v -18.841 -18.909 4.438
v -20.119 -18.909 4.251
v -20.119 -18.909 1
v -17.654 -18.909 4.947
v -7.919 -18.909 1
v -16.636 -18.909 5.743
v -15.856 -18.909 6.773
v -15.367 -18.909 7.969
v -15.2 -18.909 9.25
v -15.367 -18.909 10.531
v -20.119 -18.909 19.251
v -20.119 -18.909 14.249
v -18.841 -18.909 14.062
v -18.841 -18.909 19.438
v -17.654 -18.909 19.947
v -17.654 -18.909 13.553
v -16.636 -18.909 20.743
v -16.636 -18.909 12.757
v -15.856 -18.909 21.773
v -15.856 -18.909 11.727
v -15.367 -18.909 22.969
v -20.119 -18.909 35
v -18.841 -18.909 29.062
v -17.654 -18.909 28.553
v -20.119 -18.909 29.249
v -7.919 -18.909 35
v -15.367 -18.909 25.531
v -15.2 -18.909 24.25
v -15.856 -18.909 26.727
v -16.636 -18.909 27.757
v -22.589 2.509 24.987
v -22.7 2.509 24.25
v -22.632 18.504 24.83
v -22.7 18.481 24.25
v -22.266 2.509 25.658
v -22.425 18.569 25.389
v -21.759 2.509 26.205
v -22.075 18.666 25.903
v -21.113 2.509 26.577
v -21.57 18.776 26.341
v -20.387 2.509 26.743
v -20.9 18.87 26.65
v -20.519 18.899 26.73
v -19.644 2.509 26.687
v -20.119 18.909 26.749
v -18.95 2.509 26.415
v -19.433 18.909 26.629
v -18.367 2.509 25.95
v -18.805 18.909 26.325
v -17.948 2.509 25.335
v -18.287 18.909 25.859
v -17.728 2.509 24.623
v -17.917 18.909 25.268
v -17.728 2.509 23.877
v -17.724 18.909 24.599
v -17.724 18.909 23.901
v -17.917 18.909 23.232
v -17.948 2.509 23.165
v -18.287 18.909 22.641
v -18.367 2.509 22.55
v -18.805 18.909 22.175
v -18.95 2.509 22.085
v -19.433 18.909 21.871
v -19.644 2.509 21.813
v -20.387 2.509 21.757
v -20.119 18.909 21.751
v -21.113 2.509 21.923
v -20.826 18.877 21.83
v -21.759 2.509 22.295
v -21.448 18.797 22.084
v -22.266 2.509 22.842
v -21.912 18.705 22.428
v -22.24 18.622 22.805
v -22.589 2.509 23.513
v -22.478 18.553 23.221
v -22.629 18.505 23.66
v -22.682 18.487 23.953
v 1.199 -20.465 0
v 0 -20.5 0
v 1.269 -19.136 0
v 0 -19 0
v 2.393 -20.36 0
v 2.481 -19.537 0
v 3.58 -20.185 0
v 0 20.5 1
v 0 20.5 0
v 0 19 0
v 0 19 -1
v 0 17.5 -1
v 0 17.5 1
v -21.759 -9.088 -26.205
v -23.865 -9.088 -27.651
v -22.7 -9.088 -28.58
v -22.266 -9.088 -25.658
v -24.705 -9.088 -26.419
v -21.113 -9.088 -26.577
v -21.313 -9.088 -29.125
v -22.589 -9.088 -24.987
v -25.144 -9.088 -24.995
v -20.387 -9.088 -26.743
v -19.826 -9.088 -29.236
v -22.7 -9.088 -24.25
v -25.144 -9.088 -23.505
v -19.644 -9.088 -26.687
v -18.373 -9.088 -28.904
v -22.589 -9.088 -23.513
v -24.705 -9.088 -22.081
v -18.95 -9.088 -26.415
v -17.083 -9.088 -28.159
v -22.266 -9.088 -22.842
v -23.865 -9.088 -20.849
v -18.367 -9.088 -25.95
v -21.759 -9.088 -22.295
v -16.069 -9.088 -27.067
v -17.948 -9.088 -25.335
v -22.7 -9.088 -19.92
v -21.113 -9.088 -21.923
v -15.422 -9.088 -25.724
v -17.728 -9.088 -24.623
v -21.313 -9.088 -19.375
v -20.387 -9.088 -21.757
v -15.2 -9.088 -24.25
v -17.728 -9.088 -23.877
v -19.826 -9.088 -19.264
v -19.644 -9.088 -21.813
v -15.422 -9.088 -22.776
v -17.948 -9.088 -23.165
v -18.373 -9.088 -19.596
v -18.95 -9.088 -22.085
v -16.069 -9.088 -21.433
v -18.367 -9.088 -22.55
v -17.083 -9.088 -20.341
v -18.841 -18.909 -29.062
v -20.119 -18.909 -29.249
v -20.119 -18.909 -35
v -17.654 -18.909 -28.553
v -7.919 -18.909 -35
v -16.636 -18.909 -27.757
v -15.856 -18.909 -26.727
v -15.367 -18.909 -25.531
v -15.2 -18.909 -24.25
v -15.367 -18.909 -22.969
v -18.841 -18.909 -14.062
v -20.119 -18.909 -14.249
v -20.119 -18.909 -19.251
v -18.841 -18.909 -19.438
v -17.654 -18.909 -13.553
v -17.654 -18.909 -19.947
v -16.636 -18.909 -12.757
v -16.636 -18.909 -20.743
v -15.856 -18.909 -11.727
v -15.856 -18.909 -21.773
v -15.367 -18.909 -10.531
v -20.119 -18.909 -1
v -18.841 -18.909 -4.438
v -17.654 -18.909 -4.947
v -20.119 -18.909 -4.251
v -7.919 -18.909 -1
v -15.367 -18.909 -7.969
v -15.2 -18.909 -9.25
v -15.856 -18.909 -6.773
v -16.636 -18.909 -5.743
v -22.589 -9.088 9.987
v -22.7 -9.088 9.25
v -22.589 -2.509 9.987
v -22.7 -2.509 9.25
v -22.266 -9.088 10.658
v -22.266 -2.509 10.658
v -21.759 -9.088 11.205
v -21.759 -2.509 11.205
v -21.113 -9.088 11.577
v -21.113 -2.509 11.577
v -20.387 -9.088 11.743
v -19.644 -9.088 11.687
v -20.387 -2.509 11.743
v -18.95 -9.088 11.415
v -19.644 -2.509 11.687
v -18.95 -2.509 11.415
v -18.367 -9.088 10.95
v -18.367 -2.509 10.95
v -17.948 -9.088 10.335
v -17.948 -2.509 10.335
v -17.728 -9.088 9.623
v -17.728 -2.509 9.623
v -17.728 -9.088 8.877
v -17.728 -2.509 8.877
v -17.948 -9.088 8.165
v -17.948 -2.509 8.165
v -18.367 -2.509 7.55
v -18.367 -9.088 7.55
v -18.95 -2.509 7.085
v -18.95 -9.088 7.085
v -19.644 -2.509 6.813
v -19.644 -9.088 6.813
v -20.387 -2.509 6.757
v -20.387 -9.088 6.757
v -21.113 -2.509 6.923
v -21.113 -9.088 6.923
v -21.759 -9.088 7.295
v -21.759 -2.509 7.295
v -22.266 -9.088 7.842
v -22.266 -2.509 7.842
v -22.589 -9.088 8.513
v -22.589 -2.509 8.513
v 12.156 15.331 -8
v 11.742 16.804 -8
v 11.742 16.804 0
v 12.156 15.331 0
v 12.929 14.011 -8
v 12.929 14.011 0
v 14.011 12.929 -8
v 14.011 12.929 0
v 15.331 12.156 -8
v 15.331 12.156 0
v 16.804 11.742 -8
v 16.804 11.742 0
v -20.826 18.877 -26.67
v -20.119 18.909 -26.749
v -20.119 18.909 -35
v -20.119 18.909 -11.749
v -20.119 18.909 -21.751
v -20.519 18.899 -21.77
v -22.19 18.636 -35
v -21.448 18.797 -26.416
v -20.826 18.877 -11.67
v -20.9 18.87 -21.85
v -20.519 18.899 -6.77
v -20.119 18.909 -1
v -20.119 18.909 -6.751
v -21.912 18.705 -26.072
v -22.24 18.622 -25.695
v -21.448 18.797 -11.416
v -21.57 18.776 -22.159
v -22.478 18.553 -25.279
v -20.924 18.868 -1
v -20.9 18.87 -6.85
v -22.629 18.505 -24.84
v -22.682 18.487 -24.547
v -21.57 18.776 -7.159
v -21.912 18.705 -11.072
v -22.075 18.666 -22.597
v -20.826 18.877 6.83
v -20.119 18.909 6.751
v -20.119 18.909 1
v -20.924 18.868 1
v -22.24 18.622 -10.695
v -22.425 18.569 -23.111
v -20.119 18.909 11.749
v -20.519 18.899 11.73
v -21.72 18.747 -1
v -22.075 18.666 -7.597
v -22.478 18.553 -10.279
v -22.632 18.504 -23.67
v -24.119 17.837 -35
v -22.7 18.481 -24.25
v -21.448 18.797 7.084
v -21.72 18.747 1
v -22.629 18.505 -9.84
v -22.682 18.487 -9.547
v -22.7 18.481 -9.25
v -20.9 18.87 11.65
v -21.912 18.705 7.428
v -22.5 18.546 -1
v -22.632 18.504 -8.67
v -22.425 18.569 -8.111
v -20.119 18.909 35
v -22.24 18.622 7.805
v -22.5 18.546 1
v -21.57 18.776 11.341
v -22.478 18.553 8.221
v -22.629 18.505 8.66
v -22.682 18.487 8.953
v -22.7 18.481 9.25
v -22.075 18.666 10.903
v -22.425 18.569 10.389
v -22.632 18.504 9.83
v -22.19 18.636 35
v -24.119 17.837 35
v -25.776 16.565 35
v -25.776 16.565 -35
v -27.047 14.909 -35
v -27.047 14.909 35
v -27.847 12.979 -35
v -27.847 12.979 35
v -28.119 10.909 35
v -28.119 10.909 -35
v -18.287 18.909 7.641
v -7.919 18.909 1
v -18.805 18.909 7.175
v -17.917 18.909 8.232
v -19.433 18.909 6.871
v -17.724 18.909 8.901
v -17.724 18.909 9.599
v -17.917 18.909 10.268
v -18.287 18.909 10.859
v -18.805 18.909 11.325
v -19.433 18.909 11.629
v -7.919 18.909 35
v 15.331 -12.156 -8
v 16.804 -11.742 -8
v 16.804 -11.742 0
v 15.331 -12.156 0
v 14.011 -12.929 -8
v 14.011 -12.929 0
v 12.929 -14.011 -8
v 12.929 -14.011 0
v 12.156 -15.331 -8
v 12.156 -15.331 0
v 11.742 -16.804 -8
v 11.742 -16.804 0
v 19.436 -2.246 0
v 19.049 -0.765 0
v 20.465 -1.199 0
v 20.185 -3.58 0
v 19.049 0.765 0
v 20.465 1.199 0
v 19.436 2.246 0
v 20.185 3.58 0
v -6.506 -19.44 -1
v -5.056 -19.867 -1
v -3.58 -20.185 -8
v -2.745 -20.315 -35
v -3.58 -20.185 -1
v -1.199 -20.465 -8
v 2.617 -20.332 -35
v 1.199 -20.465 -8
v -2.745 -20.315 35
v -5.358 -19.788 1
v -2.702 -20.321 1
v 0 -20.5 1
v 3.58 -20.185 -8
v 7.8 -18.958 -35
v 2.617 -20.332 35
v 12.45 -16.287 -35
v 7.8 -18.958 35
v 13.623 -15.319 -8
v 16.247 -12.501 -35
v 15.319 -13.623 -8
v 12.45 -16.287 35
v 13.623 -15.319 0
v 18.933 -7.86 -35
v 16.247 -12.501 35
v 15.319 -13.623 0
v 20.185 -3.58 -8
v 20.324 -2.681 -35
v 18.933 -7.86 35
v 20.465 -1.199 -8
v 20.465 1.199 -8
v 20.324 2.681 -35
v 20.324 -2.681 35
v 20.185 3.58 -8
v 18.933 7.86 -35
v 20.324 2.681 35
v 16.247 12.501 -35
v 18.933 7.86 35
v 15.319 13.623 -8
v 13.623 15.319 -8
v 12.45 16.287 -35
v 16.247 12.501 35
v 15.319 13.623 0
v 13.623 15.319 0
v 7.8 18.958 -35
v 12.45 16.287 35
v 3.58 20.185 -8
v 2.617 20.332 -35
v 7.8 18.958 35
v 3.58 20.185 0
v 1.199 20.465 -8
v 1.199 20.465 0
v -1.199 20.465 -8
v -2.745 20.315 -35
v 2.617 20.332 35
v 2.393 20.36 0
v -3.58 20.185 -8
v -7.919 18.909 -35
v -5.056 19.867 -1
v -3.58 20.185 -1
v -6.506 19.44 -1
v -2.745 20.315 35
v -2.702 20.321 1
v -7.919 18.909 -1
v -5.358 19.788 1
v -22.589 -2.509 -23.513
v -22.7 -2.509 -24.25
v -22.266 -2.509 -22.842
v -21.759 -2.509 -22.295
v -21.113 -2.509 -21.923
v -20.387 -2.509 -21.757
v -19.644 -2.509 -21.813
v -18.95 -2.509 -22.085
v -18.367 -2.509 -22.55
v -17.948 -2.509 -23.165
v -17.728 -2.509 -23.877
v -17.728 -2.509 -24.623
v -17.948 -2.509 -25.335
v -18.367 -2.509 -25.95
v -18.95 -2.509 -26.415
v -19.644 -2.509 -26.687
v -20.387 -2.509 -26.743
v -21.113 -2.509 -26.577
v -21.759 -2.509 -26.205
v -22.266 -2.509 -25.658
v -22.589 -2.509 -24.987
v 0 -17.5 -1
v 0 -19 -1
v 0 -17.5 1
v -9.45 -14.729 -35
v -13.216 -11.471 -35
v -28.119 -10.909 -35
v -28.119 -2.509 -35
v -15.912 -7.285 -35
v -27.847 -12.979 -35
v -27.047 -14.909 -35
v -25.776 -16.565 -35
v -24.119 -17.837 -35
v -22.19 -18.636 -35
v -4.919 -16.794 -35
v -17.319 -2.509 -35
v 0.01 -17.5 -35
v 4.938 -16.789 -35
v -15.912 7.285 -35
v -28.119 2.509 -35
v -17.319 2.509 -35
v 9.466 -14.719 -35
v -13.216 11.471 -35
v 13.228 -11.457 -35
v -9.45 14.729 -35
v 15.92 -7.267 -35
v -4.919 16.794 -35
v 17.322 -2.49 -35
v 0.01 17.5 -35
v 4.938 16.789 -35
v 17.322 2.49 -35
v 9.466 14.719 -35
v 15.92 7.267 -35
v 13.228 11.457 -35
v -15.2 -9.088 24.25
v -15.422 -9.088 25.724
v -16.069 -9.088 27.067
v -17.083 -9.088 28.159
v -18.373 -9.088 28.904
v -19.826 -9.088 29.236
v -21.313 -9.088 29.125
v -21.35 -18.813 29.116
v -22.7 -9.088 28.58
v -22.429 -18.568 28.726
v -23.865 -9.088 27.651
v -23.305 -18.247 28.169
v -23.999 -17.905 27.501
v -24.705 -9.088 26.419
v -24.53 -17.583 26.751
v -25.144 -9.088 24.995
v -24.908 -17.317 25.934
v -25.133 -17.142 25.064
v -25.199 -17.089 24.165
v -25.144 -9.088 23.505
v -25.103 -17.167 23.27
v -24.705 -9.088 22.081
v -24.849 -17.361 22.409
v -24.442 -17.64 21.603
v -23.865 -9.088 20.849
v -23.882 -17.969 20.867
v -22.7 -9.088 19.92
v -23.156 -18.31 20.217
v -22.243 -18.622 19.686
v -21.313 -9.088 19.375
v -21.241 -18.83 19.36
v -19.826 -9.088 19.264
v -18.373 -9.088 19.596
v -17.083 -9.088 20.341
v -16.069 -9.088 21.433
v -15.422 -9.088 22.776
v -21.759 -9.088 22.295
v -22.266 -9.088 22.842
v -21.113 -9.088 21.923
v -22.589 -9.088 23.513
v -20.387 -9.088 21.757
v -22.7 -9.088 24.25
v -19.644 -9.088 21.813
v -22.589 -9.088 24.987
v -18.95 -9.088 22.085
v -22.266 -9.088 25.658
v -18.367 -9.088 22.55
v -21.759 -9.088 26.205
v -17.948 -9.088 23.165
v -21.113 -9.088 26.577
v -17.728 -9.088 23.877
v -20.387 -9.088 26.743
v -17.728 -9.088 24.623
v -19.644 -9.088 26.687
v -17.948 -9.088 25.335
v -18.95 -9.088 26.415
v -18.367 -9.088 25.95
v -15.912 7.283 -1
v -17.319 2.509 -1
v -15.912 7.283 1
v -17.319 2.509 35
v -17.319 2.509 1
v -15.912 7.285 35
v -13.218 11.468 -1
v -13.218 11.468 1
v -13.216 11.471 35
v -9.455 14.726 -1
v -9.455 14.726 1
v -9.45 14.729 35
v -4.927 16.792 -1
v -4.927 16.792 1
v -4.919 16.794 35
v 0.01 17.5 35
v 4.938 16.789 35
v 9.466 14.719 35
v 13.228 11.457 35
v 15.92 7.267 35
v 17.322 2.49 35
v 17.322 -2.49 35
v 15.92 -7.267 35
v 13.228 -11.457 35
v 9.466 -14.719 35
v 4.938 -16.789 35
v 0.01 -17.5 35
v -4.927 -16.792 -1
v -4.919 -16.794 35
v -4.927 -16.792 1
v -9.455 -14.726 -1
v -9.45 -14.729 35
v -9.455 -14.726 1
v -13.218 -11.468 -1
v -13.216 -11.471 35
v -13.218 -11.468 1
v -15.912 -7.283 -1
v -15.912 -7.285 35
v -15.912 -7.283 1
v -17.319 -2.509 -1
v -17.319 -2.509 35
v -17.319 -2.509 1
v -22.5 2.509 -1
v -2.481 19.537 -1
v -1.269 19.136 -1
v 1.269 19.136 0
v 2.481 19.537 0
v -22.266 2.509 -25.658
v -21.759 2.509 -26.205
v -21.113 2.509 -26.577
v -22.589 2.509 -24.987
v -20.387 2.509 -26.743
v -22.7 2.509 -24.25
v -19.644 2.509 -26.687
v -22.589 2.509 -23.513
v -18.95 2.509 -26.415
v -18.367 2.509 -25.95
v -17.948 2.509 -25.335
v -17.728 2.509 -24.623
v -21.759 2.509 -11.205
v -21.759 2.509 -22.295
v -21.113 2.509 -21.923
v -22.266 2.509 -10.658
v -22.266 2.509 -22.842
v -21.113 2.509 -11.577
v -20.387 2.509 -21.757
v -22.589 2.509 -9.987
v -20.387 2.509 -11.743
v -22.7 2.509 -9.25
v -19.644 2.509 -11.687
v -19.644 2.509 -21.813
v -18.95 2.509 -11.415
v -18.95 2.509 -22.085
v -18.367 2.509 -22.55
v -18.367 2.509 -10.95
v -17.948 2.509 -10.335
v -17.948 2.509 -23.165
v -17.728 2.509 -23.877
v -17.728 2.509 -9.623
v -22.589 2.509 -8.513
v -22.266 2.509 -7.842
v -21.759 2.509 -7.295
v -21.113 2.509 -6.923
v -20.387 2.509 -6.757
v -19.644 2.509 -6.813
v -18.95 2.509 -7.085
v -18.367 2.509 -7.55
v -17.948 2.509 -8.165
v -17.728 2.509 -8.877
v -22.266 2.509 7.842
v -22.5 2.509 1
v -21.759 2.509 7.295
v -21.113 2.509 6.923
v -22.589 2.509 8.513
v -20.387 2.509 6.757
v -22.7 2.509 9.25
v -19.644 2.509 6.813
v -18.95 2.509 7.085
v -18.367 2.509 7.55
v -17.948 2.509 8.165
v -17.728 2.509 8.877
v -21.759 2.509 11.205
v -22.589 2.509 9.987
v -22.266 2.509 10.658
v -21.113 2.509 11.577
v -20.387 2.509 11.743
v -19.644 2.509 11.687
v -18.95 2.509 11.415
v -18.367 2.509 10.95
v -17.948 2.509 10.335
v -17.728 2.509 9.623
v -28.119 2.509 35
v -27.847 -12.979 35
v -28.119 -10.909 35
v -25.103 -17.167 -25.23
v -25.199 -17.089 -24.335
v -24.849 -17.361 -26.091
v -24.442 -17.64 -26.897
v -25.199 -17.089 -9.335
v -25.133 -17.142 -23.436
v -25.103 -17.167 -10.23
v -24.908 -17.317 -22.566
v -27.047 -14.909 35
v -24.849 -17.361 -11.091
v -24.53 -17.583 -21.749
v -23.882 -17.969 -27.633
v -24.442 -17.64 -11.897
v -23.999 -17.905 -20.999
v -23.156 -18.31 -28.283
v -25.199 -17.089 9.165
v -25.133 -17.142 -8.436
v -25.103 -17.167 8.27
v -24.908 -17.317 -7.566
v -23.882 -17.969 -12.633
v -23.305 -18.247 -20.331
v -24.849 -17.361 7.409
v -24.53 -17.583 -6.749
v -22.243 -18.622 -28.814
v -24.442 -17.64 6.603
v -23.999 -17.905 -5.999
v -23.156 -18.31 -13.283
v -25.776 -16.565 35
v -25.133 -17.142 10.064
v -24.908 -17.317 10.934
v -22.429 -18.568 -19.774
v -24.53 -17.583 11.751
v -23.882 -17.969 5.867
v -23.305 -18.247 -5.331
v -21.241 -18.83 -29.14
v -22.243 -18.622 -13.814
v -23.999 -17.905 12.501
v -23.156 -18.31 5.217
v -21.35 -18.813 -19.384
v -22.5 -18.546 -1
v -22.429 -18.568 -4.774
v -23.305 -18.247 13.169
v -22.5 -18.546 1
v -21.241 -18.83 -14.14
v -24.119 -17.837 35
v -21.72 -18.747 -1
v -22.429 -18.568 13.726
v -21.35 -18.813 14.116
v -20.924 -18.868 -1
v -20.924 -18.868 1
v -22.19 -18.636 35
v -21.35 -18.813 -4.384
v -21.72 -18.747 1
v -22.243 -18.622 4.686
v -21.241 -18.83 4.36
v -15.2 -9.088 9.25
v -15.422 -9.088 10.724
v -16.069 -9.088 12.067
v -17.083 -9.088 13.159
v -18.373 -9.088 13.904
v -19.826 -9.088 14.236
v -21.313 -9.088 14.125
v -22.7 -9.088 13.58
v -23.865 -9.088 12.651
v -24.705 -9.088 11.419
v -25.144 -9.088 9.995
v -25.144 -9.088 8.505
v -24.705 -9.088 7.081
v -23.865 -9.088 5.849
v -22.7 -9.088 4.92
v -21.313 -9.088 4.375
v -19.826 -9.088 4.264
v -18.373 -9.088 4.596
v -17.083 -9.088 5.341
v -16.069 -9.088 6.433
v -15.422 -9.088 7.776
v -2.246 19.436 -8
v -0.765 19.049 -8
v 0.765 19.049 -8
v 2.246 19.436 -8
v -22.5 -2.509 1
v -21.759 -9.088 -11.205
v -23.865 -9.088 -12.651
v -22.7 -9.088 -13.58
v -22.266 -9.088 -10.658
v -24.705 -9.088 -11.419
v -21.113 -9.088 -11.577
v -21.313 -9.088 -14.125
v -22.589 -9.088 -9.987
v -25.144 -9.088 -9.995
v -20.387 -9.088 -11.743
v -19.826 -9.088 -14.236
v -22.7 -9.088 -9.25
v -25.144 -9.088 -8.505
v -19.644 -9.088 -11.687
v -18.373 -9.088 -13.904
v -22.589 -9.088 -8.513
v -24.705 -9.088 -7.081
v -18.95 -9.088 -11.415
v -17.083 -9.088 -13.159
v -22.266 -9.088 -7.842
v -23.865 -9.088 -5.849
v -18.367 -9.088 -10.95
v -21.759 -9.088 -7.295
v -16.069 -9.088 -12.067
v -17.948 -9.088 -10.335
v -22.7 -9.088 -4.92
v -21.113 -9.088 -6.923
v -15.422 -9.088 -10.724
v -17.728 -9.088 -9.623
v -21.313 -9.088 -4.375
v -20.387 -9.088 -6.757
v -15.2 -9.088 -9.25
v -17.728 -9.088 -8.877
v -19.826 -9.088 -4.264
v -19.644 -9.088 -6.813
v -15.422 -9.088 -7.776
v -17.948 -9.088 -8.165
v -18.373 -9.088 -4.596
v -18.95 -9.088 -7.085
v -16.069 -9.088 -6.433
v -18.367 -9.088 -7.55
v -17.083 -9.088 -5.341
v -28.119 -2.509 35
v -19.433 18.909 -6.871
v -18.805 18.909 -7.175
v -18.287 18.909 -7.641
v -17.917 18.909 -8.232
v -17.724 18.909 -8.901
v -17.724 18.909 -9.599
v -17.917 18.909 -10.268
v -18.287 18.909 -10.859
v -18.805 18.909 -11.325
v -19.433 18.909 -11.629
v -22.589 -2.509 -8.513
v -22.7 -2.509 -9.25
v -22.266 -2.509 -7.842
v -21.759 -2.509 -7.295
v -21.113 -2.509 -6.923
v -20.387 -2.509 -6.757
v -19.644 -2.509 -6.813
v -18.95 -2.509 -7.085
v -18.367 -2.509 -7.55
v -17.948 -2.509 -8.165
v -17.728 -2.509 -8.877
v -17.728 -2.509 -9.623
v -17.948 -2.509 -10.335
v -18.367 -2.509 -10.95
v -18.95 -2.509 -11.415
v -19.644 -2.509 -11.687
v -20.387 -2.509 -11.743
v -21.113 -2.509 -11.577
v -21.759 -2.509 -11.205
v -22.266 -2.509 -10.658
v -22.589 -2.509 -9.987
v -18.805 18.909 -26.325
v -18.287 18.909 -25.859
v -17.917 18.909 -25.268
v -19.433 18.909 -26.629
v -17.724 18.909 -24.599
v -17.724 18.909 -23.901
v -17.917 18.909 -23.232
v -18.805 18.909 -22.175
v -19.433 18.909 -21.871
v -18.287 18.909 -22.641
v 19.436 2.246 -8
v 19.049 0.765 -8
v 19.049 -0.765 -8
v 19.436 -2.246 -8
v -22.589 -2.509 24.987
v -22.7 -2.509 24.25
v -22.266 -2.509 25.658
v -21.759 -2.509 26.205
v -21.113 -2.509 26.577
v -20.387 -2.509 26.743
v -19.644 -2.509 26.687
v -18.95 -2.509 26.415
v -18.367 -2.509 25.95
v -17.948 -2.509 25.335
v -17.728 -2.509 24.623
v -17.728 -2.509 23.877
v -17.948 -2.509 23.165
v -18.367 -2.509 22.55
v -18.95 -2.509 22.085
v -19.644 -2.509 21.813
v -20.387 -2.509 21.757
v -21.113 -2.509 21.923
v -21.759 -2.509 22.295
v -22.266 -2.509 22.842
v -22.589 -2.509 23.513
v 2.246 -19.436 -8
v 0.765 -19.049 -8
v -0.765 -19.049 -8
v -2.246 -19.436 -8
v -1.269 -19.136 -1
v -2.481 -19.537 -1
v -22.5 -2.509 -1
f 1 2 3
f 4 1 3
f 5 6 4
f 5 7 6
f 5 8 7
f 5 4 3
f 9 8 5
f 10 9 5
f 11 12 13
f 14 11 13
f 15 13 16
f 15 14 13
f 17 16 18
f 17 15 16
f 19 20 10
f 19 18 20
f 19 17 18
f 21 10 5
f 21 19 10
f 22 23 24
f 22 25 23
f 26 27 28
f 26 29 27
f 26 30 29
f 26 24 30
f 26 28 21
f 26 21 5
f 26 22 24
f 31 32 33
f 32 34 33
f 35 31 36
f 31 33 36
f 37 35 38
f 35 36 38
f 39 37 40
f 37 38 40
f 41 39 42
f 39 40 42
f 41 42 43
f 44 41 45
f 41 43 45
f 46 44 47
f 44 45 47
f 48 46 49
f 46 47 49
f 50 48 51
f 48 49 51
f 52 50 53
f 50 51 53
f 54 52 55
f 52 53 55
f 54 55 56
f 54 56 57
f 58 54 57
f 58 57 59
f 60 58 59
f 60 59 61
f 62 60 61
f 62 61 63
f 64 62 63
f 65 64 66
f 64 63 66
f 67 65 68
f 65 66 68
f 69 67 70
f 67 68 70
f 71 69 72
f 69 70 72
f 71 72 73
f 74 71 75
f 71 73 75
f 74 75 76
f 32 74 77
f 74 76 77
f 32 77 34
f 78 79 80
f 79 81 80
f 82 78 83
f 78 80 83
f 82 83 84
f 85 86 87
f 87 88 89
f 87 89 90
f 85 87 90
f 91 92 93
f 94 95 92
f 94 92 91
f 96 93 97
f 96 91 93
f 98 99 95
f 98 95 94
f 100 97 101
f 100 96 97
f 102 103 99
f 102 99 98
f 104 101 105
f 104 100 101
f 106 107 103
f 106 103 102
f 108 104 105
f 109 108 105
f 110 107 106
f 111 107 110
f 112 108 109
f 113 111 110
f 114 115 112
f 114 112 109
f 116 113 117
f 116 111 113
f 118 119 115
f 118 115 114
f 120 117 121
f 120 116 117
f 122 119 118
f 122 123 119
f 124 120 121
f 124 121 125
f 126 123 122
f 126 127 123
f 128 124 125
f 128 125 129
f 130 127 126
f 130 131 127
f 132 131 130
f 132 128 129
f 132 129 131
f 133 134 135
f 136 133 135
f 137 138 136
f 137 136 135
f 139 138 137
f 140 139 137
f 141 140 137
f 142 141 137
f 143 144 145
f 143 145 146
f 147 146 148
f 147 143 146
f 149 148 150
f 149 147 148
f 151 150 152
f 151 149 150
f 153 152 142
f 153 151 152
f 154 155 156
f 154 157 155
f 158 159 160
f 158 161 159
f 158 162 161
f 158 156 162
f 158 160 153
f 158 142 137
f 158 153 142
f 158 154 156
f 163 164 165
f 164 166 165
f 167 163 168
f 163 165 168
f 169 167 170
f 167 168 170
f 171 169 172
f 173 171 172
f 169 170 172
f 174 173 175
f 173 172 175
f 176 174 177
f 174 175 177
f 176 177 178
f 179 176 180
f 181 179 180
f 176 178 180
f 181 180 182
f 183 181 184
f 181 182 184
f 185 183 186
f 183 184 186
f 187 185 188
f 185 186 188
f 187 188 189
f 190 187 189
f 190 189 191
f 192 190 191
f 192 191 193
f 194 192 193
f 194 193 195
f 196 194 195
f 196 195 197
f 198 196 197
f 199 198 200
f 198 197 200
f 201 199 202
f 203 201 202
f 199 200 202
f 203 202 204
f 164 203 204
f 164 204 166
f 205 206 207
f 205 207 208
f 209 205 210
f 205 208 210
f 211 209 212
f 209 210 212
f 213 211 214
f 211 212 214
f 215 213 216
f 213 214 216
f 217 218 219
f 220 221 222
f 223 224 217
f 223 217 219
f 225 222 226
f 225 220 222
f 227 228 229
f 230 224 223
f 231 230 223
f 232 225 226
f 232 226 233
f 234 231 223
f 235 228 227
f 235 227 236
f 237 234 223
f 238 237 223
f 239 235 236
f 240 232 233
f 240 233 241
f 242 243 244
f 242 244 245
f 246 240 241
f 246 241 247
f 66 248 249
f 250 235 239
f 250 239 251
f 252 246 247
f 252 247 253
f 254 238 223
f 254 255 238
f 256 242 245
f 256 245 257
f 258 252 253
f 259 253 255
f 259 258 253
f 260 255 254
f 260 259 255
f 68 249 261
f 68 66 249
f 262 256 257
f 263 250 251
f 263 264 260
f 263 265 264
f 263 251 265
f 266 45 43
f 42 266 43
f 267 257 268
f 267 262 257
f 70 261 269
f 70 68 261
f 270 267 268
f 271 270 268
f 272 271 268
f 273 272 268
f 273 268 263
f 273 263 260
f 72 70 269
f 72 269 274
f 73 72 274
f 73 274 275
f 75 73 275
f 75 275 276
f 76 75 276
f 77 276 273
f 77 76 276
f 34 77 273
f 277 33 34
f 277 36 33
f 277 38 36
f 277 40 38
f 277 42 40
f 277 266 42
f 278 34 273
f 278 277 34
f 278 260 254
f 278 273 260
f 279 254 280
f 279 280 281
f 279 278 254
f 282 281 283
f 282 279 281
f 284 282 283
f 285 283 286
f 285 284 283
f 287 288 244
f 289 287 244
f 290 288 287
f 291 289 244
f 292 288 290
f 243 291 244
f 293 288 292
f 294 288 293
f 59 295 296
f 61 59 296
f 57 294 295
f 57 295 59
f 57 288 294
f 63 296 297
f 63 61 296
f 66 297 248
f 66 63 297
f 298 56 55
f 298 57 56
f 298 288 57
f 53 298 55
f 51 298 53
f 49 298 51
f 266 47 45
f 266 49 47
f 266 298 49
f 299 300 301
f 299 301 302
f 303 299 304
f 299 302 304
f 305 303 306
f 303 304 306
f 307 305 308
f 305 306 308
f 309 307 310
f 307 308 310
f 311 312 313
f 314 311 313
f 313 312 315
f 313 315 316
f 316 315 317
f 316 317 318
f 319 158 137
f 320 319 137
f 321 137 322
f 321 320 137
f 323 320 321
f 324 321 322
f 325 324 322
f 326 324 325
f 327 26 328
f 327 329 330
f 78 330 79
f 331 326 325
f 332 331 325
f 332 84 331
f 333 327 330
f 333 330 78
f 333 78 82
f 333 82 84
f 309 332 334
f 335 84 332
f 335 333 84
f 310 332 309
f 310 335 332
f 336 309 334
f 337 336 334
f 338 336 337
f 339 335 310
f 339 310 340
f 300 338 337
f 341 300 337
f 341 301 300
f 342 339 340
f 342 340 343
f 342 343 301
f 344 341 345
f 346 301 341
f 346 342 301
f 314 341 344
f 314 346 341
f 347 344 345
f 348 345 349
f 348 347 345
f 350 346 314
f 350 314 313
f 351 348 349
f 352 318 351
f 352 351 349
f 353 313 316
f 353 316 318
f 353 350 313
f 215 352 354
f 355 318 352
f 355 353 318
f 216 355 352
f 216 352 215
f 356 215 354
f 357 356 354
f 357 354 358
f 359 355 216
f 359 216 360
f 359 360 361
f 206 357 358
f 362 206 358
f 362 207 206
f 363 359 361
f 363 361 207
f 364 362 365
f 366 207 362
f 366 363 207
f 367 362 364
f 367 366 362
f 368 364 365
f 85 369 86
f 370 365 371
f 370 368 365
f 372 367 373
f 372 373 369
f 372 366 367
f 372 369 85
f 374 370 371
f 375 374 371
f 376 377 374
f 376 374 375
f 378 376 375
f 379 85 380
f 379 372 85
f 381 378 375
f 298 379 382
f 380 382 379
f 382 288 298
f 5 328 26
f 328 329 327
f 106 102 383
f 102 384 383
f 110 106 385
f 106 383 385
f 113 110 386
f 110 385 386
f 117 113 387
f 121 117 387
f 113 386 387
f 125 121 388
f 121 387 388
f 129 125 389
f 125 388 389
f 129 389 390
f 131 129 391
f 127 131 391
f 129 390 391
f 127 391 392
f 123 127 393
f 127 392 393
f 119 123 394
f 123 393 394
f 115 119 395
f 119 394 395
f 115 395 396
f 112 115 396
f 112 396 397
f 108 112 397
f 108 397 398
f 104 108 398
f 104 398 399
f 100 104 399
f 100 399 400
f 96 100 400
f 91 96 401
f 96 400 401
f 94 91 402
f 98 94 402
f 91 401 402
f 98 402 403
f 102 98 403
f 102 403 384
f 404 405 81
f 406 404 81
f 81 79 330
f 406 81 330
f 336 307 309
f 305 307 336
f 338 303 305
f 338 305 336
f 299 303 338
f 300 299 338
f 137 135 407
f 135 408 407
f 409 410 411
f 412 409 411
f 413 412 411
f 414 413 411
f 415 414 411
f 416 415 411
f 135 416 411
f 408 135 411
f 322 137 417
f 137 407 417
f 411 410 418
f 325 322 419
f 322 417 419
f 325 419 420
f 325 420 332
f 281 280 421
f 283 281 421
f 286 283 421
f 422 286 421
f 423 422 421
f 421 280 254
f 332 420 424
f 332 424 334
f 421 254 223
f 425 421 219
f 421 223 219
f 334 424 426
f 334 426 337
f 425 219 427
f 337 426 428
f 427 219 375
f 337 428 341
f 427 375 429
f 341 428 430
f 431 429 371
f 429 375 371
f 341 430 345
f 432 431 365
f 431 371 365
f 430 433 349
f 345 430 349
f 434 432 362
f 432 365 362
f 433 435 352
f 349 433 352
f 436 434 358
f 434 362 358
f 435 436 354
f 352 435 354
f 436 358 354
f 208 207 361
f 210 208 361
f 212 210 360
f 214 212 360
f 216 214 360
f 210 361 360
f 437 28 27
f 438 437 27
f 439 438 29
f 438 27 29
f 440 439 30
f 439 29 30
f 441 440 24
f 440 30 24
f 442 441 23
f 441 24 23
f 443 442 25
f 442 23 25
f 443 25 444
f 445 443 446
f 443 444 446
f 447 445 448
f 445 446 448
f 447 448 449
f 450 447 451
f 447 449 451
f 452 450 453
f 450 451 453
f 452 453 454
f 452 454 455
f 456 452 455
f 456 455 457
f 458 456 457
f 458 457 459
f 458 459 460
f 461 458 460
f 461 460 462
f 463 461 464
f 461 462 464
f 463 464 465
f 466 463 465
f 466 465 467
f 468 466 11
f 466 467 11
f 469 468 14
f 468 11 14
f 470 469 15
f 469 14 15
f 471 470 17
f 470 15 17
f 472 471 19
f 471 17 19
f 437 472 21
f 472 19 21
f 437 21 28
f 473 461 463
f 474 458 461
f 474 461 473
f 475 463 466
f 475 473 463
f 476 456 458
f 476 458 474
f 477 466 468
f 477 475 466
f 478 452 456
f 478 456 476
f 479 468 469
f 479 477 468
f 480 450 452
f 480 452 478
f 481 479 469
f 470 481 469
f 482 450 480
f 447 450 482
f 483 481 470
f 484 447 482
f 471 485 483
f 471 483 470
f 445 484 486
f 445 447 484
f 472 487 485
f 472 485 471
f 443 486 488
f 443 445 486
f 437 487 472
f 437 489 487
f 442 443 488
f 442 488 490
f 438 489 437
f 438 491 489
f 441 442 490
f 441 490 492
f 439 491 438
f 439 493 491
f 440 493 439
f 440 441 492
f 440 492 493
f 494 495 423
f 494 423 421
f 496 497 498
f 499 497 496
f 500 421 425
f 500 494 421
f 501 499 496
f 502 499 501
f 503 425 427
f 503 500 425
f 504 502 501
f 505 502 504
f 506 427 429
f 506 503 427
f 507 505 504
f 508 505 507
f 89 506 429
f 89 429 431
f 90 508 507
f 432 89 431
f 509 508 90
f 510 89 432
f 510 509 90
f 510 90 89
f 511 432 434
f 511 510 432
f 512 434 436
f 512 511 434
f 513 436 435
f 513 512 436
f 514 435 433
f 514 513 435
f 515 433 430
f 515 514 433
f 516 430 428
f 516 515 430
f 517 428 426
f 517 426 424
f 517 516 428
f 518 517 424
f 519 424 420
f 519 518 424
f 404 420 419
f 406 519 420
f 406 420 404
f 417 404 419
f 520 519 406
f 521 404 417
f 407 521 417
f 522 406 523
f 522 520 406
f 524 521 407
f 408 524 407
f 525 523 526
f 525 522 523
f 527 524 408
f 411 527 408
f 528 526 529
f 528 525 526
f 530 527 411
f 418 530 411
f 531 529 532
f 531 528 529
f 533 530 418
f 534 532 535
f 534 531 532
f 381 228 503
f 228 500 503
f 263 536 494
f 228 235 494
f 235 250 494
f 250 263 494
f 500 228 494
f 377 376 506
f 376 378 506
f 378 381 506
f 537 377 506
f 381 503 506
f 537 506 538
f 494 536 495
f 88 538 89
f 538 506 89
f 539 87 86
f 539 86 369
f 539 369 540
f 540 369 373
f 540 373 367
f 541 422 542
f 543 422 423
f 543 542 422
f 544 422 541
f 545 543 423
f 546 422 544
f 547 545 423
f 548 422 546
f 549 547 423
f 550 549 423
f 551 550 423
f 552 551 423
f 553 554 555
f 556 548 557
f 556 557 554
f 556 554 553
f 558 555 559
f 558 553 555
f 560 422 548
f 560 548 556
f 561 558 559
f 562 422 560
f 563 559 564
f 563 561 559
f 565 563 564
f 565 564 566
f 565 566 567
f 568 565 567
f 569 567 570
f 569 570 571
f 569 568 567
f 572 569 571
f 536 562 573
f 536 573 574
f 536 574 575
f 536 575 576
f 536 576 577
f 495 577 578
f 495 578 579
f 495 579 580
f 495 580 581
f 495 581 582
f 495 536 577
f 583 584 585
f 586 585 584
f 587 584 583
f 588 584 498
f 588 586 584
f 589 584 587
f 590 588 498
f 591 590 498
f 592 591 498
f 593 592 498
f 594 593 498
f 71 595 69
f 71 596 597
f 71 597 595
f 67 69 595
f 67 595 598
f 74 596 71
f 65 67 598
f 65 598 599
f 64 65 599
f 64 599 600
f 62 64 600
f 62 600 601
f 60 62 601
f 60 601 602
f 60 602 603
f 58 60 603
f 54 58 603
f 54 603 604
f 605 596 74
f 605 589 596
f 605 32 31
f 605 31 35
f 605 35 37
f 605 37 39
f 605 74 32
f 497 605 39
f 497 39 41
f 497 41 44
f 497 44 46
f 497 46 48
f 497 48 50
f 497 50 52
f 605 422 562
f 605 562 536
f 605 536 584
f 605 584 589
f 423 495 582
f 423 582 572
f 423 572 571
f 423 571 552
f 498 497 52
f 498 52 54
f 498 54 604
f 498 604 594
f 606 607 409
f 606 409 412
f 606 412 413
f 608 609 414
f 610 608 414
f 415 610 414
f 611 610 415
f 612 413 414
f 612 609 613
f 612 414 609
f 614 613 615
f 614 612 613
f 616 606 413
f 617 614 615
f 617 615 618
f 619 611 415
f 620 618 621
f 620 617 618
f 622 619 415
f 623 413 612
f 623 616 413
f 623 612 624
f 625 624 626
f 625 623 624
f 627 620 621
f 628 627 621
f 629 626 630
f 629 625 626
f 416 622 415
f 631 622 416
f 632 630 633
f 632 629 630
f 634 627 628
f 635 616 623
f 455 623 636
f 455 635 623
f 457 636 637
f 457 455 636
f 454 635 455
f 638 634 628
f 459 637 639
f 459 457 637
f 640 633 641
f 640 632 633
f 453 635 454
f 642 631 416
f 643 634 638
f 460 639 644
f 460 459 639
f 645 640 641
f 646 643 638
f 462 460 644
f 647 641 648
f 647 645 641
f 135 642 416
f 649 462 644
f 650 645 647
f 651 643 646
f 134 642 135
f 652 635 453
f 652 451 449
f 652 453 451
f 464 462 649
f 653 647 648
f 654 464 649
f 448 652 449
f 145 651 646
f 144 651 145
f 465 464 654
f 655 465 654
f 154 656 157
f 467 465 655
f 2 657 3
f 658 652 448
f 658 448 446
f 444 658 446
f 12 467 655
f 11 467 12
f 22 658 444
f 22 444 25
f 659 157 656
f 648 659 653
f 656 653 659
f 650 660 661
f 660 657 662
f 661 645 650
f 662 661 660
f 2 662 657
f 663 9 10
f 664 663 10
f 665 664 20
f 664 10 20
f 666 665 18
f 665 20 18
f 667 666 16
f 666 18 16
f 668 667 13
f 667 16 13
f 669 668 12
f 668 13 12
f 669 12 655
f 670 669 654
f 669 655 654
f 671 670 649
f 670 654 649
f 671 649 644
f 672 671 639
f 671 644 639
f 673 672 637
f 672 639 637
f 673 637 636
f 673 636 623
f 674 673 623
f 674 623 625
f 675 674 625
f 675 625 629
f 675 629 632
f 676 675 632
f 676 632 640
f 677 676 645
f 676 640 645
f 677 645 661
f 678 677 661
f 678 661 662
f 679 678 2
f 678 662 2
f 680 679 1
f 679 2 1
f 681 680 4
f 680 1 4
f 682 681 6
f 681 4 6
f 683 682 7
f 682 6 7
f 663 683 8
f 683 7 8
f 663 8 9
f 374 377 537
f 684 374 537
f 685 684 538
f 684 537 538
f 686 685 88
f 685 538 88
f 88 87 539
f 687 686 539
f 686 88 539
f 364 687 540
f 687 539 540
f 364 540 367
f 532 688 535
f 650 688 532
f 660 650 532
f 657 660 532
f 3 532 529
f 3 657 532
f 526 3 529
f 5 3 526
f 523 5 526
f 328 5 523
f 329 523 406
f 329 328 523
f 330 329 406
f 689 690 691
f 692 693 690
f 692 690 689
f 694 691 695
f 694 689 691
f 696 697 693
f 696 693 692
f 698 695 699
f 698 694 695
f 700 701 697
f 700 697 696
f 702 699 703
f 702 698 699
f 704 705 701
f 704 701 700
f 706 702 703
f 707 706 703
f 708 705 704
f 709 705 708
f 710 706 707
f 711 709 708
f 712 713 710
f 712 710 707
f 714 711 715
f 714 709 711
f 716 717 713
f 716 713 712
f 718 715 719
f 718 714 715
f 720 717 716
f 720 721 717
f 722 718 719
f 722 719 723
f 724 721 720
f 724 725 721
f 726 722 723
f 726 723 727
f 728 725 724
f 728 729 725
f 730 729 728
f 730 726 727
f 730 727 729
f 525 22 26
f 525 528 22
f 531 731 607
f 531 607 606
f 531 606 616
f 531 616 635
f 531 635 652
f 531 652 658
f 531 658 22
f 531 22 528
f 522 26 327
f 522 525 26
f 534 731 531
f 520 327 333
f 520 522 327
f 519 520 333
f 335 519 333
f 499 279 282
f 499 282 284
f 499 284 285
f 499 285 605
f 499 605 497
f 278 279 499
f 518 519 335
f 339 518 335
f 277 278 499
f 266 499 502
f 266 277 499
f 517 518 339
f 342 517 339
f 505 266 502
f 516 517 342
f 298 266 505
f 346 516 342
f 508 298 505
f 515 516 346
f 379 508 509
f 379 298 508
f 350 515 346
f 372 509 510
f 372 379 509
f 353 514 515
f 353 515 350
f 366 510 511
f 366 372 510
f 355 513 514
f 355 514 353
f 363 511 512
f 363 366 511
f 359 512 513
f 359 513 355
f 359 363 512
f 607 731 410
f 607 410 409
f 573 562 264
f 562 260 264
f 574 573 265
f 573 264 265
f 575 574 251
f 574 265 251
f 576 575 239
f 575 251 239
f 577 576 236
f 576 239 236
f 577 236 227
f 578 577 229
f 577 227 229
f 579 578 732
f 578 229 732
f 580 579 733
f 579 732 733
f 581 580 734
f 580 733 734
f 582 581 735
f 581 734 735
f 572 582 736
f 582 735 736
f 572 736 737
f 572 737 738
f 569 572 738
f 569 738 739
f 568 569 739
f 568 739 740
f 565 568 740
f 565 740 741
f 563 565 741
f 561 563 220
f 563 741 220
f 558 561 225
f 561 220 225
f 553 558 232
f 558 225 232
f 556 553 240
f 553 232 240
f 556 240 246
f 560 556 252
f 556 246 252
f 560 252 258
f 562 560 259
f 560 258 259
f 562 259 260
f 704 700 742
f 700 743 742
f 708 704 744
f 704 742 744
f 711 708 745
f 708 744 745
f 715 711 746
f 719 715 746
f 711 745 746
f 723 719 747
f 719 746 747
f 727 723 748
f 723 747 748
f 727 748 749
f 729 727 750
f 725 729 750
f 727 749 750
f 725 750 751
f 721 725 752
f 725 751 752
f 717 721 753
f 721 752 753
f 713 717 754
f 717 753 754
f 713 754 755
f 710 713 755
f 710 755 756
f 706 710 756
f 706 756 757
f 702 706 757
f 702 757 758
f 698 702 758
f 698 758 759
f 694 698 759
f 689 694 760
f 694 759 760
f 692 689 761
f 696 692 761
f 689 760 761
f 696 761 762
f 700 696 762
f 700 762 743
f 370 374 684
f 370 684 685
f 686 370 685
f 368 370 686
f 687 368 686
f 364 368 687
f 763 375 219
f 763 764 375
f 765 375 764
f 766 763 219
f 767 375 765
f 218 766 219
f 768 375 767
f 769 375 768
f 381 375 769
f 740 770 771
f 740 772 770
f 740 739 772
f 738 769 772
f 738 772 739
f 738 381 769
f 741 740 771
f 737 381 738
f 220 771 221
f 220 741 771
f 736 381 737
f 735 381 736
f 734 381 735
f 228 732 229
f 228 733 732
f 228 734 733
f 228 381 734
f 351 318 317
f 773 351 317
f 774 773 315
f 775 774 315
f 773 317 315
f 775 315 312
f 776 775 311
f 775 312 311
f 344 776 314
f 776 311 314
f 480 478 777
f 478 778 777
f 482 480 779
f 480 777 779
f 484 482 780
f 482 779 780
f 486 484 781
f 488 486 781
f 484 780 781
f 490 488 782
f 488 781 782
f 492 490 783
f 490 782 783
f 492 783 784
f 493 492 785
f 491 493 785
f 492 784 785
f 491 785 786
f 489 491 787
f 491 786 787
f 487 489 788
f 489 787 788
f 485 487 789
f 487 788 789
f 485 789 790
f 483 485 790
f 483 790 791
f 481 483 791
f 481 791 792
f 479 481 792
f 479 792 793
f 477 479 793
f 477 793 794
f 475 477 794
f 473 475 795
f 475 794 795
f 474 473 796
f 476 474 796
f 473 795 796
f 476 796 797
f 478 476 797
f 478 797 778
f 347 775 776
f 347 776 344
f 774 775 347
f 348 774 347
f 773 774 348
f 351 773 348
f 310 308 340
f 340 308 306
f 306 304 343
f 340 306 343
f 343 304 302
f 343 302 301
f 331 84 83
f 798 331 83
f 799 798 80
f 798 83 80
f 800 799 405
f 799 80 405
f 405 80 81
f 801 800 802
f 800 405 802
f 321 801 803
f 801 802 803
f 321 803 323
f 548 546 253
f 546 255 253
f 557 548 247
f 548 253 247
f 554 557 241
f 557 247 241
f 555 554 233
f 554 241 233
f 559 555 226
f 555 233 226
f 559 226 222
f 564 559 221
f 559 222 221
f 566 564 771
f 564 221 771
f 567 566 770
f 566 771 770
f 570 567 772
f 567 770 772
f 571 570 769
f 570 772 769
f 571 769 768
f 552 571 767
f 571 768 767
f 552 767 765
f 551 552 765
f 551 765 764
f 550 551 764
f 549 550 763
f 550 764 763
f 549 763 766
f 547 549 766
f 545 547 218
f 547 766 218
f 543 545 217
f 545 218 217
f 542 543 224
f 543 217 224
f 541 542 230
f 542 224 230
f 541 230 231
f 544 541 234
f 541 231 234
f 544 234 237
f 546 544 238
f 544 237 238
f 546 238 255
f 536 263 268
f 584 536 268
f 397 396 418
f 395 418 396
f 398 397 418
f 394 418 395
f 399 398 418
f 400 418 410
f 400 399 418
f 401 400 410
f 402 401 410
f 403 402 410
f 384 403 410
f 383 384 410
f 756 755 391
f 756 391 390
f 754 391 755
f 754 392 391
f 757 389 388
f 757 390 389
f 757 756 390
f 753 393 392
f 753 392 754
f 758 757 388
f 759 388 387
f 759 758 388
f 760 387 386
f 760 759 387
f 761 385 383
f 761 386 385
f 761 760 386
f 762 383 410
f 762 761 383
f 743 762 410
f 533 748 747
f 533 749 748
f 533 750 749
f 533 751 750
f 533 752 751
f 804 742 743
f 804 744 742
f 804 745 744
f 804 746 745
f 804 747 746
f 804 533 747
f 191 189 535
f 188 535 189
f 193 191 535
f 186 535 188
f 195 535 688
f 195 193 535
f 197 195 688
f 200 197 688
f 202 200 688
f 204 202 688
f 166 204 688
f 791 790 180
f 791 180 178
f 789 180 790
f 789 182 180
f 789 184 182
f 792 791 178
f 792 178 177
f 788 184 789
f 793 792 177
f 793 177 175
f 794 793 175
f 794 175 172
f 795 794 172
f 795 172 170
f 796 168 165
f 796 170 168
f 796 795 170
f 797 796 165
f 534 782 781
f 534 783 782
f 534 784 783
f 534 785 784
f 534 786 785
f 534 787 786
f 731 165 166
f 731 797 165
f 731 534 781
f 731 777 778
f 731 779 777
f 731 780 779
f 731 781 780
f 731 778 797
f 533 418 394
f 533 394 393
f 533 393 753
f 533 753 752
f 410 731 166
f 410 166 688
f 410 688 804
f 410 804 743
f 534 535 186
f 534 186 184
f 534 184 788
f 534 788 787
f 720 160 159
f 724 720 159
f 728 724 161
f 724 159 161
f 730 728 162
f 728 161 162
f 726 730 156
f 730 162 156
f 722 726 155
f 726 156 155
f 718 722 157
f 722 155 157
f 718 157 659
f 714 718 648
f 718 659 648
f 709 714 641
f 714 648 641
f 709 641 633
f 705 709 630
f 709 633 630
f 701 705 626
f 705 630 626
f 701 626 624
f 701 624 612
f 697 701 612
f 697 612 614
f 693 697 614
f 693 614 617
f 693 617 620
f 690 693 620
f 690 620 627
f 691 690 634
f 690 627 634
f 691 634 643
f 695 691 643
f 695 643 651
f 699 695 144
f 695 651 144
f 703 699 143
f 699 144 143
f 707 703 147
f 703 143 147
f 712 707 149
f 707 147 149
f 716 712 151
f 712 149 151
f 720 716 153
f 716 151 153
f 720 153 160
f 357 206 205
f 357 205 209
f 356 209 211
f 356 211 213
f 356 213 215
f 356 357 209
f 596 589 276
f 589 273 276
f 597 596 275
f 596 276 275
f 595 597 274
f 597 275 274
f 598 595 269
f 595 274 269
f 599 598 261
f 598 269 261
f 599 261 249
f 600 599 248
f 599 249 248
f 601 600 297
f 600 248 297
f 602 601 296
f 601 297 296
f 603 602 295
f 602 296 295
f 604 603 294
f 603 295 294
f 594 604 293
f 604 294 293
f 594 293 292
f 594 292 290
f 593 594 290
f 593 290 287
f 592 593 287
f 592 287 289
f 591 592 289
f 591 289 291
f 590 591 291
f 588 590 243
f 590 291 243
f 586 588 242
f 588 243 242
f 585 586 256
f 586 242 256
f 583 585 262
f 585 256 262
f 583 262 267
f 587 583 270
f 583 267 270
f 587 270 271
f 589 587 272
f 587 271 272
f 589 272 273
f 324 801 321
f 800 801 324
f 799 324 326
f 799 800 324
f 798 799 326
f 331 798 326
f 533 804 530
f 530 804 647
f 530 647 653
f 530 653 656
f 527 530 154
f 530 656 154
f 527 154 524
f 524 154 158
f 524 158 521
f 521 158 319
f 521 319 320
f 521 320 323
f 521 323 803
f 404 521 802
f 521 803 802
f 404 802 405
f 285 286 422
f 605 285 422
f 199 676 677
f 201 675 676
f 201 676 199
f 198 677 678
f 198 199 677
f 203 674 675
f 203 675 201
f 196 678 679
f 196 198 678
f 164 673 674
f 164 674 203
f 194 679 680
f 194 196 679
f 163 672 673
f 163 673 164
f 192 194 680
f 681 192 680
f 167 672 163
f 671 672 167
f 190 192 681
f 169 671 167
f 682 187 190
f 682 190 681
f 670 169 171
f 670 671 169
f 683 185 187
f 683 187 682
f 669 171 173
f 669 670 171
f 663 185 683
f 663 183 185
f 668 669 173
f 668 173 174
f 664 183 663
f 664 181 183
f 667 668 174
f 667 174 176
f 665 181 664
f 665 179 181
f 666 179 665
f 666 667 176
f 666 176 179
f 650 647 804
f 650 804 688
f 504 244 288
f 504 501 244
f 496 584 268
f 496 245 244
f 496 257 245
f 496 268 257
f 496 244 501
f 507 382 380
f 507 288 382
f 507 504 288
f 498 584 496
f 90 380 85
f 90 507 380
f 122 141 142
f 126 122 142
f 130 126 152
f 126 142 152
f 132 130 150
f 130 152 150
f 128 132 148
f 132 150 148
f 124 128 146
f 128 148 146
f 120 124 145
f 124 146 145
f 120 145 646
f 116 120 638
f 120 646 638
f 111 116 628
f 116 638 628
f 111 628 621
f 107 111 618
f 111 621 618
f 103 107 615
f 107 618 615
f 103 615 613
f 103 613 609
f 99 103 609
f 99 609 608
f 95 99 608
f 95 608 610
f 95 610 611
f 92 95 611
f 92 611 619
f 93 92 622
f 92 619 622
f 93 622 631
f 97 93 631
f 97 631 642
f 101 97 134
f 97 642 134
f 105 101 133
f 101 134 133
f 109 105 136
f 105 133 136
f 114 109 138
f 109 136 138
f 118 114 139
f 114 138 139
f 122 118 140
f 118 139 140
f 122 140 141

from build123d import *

# Parameters (mm, degrees)
F1_DEPTH       = 35
F3_D           = 5
F3_START       = 1.8205079
F3_CBORE_D     = 10
F3_CBORE_DEPTH = 8
F4_W           = 22.5
F4_H           = 2
F5_DEPTH       = 25
F6_R           = 6
F7_DEPTH       = 8


with BuildPart() as f1:
    # F0 (on Top) → F1 (new body, symmetric)
    with BuildSketch(Plane.XY):
        with BuildLine():
            ThreePointArc((-17.3192642082, 2.5086026559), (17.5, 0), (-17.3192642082, -2.5086026559))
            Line((-17.3192642082, -2.5086026559), (-28.1192642082, -2.5086026559))
            Line((-28.1192642082, -2.5086026559), (-28.1192642082, -10.9086026559))
            ThreePointArc((-28.1192642082, -10.9086026559), (-25.7761184577, -16.5654569054), (-20.1192642082, -18.9086026559))
            Line((-20.1192642082, -18.9086026559), (-7.9192642082, -18.9086026559))
            ThreePointArc((-7.9192642082, -18.9086026559), (20.5, 0), (-7.9192642082, 18.9086026559))
            Line((-7.9192642082, 18.9086026559), (-20.1192642082, 18.9086026559))
            ThreePointArc((-20.1192642082, 18.9086026559), (-25.7761184577, 16.5654569054), (-28.1192642082, 10.9086026559))
            Line((-28.1192642082, 10.9086026559), (-28.1192642082, 2.5086026559))
            Line((-28.1192642082, 2.5086026559), (-17.3192642082, 2.5086026559))
        make_face()
    extrude(amount=F1_DEPTH, both=True)

    # F3 (through all)
    # its depths count from where the whole tool has entered the part; down to there all is cleared
    with Locations(Plane.XZ.offset(18.9086026559).offset(-F3_START)):
        with Locations((-20.2, 24.25), (-20.2, 9.25), (-20.2, -9.25), (-20.2, -24.25)):
            CounterBoreHole(F3_D / 2, F3_CBORE_D / 2, F3_CBORE_DEPTH)

    # F4 (on Front) → F5 (cut, symmetric)
    with BuildSketch(Plane.XZ):
        with Locations((-11.25, 0)):
            Rectangle(F4_W, F4_H)
    extrude(amount=F5_DEPTH, both=True, mode=Mode.SUBTRACT)

    # F6 (on Top) → F7 (cut)
    with BuildSketch(Plane.XY):
        with Locations((0, -25)):
            Circle(F6_R)
        with Locations((17.6776695297, -17.6776695297)):
            Circle(F6_R)
        with Locations((25, 0)):
            Circle(F6_R)
        with Locations((17.6776695297, 17.6776695297)):
            Circle(F6_R)
        with Locations((0, 25)):
            Circle(F6_R)
    extrude(amount=-F7_DEPTH, mode=Mode.SUBTRACT)


solid = f1.part
